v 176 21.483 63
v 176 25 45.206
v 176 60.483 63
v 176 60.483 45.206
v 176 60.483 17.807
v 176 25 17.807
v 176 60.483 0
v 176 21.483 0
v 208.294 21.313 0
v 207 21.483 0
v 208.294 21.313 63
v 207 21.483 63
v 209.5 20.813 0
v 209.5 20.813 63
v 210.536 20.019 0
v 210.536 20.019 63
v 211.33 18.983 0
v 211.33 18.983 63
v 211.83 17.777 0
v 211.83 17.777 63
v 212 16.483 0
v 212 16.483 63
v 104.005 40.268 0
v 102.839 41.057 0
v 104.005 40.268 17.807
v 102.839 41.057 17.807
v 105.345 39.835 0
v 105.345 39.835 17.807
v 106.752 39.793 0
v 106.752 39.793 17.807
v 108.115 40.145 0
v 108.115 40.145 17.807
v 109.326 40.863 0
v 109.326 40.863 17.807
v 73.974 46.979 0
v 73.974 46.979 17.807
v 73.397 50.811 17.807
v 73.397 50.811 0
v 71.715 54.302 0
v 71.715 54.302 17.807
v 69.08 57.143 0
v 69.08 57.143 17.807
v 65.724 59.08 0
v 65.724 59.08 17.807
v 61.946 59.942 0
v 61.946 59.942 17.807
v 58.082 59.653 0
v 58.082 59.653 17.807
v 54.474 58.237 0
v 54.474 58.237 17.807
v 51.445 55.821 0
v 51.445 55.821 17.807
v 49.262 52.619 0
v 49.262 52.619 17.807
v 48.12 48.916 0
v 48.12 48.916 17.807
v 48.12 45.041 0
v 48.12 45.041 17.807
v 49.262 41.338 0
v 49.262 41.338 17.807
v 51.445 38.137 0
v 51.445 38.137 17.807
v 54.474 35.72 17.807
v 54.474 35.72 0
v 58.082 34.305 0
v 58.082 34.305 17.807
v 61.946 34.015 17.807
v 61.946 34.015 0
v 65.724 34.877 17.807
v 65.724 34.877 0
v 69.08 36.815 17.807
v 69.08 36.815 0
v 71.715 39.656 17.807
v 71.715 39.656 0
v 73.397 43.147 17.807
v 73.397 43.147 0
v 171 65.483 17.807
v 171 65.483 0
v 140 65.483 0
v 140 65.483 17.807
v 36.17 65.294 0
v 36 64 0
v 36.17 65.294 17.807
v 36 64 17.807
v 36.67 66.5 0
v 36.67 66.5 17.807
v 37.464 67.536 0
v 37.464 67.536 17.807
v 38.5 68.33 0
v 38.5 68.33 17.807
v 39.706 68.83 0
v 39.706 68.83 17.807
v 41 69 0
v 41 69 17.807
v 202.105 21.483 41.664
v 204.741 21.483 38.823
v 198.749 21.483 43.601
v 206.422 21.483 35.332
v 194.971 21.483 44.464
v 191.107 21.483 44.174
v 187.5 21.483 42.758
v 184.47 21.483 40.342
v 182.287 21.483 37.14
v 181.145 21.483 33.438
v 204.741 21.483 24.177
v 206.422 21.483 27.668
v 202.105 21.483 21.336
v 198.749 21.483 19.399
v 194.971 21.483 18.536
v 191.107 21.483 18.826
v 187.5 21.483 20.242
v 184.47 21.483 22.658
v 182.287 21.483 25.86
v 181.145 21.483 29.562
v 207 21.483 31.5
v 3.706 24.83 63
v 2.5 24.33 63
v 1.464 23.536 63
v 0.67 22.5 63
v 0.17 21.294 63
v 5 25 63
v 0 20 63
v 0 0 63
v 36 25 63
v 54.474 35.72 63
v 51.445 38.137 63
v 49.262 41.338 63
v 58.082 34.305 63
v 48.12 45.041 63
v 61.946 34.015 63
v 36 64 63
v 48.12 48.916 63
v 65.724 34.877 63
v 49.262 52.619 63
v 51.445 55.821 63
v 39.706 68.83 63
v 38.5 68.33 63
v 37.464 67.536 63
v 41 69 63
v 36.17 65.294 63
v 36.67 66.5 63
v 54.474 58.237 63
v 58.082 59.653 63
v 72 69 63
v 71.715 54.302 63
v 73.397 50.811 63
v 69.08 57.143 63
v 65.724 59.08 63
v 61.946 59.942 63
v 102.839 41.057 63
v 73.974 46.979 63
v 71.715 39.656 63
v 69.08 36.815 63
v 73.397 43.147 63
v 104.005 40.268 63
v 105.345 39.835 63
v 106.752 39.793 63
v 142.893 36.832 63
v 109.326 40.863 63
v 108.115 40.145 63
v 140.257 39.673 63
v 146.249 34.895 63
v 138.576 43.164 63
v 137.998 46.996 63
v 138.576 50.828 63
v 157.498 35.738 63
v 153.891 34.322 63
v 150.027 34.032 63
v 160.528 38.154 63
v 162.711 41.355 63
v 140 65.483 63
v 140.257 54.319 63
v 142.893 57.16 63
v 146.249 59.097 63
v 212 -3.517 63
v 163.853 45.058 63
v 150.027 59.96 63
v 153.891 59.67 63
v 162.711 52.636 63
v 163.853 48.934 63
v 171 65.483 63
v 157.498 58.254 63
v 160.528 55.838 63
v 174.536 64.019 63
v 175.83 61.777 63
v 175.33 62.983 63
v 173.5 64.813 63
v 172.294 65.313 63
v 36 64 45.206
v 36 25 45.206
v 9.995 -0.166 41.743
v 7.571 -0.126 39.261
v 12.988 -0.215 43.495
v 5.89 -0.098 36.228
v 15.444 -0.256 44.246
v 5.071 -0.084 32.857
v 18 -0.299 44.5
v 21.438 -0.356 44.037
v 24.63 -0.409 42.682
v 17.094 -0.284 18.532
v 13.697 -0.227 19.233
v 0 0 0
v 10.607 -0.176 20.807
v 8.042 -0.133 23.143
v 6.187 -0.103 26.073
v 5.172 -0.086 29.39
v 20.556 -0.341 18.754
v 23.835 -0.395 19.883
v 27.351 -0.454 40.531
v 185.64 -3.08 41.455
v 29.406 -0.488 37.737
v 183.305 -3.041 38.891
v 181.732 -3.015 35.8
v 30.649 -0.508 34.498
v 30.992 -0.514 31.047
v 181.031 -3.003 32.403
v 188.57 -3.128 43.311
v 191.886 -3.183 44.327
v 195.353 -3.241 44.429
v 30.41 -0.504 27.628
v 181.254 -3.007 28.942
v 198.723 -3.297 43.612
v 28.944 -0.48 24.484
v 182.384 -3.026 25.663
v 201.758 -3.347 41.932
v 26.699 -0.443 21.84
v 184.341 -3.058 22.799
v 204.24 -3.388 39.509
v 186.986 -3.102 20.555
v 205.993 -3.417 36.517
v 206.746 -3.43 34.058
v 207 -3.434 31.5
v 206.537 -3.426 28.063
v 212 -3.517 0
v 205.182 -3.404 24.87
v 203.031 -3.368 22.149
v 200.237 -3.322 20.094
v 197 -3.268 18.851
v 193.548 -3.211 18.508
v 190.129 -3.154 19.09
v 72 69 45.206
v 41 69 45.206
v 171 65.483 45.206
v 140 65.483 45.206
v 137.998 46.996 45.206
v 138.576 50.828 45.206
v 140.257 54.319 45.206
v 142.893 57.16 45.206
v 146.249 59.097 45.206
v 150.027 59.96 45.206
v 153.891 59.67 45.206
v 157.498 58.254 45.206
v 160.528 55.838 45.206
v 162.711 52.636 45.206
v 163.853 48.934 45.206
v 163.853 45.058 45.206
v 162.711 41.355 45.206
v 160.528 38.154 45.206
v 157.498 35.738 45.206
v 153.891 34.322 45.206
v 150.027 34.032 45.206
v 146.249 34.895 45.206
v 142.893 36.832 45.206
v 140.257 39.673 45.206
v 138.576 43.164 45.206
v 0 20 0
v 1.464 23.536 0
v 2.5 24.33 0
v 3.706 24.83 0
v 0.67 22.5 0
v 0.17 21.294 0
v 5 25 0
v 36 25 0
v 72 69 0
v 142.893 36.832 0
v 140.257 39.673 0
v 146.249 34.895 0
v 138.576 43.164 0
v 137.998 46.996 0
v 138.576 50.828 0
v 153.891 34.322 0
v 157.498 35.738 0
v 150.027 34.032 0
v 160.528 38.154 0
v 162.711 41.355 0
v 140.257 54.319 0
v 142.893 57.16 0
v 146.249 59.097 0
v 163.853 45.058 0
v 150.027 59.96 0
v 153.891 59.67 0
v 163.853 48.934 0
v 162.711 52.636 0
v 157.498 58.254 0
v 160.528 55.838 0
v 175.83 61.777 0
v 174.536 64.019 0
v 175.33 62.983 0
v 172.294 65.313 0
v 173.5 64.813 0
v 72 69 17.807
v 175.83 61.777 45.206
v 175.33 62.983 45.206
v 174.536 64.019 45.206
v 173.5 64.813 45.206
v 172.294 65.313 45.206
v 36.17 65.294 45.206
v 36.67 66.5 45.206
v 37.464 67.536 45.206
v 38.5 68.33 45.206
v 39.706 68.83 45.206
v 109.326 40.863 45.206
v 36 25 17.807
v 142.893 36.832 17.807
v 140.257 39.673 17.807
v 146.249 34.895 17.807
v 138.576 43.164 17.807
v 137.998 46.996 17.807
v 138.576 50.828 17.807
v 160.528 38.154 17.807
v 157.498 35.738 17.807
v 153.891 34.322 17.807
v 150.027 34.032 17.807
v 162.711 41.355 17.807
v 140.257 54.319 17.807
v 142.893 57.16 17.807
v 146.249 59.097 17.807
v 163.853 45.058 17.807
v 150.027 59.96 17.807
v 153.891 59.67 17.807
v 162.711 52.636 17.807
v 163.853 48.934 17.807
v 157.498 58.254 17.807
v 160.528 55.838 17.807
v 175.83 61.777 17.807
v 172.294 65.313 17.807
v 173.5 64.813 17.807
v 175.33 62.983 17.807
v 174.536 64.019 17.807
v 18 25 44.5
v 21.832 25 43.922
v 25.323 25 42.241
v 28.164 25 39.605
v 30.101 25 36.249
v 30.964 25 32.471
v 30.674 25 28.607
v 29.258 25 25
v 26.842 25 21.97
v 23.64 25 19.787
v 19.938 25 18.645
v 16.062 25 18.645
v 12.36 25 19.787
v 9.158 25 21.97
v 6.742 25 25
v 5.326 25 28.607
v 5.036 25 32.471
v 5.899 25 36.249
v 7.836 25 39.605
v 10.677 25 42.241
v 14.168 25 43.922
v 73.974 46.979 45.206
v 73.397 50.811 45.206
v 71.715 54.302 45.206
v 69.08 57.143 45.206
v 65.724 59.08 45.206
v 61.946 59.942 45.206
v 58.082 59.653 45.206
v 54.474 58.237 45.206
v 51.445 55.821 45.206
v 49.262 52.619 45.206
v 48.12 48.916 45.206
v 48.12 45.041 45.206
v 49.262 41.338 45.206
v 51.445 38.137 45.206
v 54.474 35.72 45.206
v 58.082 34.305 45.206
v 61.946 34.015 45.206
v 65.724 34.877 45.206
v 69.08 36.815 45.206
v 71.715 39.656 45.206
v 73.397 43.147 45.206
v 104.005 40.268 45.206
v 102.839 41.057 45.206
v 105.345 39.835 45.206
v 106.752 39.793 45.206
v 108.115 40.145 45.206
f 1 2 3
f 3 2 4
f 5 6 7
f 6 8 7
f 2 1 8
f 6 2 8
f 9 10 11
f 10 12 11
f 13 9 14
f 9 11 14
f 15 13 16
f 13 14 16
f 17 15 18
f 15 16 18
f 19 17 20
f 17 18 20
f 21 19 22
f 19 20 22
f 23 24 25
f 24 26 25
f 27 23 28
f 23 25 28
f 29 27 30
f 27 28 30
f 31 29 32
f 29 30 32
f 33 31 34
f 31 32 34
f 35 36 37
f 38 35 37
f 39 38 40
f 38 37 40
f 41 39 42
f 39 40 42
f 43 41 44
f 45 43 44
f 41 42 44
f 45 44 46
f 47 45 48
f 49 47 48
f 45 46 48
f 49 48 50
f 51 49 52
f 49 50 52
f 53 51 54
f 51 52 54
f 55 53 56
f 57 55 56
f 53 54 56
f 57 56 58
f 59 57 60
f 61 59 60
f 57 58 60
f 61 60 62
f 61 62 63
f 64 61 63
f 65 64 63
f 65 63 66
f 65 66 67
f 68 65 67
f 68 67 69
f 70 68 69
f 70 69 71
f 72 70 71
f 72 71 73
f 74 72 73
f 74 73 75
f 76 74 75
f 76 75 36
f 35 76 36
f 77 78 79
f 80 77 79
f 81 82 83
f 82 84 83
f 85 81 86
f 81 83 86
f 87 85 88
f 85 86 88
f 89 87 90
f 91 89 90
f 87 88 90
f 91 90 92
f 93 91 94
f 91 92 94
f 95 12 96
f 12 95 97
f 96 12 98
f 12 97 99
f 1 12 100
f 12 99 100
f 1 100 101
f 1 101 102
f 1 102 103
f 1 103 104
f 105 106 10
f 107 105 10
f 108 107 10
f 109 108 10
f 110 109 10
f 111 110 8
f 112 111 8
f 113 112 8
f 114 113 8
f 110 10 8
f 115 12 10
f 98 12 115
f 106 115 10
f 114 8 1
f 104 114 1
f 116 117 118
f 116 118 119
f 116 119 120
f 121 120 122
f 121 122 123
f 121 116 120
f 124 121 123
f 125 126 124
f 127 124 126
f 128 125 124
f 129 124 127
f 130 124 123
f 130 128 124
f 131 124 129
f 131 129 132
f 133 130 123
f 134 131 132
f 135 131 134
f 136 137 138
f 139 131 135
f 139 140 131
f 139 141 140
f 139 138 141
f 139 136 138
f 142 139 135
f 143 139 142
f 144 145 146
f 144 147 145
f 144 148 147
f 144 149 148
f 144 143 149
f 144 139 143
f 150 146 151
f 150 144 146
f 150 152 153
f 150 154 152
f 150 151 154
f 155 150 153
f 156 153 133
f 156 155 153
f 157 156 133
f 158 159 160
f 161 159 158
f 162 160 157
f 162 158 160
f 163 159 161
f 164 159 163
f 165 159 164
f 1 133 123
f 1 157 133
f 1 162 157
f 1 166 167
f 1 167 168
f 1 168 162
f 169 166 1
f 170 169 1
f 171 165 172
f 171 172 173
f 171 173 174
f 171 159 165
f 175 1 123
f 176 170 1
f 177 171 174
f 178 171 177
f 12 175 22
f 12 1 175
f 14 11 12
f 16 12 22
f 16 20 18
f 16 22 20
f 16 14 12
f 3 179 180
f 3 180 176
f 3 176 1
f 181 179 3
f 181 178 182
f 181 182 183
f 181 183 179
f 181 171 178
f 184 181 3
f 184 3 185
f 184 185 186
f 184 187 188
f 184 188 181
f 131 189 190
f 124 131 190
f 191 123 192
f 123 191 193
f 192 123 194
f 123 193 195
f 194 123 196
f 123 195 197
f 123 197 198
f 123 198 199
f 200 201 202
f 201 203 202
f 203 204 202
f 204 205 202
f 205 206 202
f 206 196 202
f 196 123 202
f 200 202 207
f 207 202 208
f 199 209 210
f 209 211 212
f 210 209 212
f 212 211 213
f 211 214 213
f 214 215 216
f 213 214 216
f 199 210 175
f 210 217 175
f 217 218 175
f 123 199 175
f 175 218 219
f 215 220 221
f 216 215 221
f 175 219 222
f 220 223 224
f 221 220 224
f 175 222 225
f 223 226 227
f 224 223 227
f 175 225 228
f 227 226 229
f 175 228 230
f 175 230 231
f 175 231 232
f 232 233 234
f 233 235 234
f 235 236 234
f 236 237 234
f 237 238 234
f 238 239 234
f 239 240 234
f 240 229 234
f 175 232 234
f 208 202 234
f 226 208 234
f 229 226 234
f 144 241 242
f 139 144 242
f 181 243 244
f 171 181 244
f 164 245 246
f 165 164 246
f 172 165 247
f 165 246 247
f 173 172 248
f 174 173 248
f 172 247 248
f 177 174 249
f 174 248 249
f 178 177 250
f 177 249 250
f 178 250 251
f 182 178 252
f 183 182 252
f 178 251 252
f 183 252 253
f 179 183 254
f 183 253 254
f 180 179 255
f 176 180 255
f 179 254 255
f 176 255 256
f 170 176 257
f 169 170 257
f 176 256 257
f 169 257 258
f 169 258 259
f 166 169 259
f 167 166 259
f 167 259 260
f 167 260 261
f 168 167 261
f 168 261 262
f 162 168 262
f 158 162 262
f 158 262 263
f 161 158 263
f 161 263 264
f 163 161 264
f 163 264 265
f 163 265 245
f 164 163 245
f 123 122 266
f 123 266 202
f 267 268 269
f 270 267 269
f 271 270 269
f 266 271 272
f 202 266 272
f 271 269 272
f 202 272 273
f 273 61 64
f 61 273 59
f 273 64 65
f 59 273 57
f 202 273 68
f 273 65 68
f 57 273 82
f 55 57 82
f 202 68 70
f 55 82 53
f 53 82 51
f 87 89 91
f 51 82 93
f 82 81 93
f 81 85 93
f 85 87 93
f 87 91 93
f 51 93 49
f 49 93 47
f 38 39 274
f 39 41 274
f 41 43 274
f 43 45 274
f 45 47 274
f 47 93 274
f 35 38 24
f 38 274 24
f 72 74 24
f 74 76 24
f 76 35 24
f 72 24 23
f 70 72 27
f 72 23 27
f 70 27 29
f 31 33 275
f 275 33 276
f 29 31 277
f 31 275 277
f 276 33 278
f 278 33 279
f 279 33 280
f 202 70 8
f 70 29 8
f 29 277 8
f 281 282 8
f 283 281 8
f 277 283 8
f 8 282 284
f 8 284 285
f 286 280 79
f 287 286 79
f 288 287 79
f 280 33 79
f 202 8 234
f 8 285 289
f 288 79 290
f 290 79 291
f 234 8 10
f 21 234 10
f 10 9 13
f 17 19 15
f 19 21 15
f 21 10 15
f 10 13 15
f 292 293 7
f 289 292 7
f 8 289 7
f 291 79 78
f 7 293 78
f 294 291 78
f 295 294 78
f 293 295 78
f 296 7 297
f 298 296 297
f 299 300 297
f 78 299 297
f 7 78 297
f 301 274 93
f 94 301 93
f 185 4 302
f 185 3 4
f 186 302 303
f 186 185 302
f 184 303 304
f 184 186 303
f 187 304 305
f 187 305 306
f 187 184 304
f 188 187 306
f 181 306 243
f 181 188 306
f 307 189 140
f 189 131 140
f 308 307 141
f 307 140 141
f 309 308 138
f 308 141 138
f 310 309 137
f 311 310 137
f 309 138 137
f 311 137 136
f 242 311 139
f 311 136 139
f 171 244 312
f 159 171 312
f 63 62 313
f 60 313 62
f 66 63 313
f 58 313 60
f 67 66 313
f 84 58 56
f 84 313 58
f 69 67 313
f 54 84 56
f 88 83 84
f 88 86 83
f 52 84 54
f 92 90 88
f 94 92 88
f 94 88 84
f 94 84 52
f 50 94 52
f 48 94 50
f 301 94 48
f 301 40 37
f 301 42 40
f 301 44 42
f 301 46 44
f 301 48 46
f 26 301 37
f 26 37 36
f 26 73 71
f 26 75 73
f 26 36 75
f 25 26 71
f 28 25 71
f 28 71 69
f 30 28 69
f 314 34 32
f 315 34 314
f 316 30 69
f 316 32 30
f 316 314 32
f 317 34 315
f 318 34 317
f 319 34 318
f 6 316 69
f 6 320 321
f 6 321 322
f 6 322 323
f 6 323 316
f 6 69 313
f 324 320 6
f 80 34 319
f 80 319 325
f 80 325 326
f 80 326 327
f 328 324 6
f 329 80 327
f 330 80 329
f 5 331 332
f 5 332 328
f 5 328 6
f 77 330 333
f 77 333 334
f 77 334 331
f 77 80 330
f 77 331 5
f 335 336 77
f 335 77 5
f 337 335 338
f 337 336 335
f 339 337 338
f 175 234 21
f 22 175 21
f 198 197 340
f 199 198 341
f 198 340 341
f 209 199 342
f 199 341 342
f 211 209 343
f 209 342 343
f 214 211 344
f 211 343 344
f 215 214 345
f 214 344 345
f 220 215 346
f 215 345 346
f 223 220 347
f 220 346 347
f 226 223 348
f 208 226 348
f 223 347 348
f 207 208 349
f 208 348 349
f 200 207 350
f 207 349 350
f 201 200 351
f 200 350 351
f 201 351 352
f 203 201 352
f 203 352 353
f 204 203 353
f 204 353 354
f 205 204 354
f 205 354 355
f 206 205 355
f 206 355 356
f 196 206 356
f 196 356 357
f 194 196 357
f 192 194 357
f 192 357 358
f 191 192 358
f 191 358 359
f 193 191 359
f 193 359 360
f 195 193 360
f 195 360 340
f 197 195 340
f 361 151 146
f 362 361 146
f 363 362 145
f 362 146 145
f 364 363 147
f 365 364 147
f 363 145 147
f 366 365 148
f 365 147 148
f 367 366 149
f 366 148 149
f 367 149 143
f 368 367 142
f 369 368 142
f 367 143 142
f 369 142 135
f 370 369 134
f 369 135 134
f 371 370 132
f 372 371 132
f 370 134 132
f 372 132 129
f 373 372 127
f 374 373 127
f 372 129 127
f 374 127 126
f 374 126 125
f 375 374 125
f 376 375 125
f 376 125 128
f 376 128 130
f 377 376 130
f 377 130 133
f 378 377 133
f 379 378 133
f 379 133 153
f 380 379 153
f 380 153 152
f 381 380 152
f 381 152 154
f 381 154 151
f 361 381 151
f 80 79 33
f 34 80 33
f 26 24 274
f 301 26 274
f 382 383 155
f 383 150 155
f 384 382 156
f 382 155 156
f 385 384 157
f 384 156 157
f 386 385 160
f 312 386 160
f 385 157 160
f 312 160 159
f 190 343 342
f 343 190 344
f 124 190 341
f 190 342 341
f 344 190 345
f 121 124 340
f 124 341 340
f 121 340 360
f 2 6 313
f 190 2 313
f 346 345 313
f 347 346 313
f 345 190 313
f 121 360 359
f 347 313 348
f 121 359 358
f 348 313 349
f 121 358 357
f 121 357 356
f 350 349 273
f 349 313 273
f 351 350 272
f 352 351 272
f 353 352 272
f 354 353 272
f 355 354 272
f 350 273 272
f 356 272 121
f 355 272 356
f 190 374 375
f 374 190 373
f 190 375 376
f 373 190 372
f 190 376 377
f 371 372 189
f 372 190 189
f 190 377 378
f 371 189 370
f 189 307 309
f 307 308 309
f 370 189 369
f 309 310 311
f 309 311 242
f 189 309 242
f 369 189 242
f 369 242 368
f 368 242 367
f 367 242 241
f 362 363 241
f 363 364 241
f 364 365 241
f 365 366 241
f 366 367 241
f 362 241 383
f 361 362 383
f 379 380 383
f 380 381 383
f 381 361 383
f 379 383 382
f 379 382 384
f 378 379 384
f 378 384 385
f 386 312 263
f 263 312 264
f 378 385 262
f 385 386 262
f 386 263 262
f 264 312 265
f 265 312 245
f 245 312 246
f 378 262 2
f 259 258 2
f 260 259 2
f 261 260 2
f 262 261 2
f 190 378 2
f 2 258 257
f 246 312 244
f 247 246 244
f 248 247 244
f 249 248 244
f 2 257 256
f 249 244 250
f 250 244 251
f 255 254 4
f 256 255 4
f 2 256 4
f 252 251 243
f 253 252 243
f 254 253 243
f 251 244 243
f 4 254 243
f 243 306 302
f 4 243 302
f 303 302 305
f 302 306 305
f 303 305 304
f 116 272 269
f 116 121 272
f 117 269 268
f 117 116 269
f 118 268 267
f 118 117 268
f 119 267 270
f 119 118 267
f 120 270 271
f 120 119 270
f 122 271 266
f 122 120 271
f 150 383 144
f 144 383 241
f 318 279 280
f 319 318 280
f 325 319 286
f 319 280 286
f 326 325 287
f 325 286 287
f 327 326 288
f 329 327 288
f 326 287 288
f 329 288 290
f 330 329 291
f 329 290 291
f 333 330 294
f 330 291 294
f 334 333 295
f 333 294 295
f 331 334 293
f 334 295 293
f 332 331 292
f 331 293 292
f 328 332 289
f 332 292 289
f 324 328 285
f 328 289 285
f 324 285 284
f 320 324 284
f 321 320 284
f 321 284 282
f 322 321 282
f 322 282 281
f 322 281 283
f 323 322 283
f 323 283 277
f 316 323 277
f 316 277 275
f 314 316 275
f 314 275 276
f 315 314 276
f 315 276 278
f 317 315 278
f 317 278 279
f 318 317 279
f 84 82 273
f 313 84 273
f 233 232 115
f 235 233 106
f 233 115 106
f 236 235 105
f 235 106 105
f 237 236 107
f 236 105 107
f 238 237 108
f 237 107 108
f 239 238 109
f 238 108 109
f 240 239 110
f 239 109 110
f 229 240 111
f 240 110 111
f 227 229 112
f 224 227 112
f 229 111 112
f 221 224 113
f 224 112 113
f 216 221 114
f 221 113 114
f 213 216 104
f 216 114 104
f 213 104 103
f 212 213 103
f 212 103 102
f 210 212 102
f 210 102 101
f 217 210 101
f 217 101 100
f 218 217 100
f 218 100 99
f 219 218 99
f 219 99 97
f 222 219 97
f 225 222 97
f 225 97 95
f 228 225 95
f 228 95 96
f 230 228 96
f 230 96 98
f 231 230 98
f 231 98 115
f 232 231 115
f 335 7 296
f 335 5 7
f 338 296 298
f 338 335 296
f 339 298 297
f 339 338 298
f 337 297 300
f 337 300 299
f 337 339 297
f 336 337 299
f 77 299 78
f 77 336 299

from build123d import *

# Parameters (mm, degrees)
BOSS_EXTRUDE1_DEPTH = 63
SKETCH10_R          = 13
CUT_EXTRUDE3_DEPTH  = 70
SKETCH12_R          = 13
CUT_EXTRUDE4_DEPTH  = 70
SKETCH16_W          = 140
SKETCH16_H          = 27.398314348
CUT_EXTRUDE6_DEPTH  = 44
SKETCH17_R          = 13
CUT_EXTRUDE7_DEPTH  = 100
FILLET1_R           = 5
FILLET2_R           = 5
FILLET3_R           = 5
FILLET4_R           = 5
FILLET5_R           = 5
FILLET6_R           = 5
FILLET7_R           = 5
FILLET8_R           = 5


with BuildPart() as part:
    # Sketch2 → Boss-Extrude1 (new body)
    with BuildSketch(Plane.XY):
        Polygon((0, 0), (212, -3.51679799), (212, 21.48320201), (176, 21.48320201), (176, 65.48320201), (140, 65.48320201), (106, 38.193220771), (72, 69), (36, 69), (36, 25), (0, 25), align=None)
    extrude(amount=BOSS_EXTRUDE1_DEPTH)

    # Sketch10 → Cut-Extrude3 (cut)
    with BuildSketch(Plane(origin=(0, 0, 0), x_dir=(-1, 0, 0), z_dir=(0, 0, -1))):
        with Locations((-150.998263924, 46.995976699)):
            Circle(SKETCH10_R)
    extrude(amount=-CUT_EXTRUDE3_DEPTH, mode=Mode.SUBTRACT)

    # Sketch12 → Cut-Extrude4 (cut)
    with BuildSketch(Plane(origin=(0, 25, 0), x_dir=(1, 0, 0), z_dir=(0, 1, 0))):
        with Locations(Location((18, -31.5, 0), (0, 0, 270))):
            Circle(SKETCH12_R)
        with Locations((194, -31.5)):
            Circle(SKETCH12_R)
    extrude(amount=-CUT_EXTRUDE4_DEPTH, mode=Mode.SUBTRACT)

    # Sketch16 → Cut-Extrude6 (cut)
    with BuildSketch(Plane(origin=(0, 69, 0), x_dir=(1, 0, 0), z_dir=(0, 1, 0))):
        with Locations((106, -31.506588427)):
            Rectangle(SKETCH16_W, SKETCH16_H)
    extrude(amount=-CUT_EXTRUDE6_DEPTH, mode=Mode.SUBTRACT)

    # Sketch17 → Cut-Extrude7 (cut)
    with BuildSketch(Plane.XY.offset(63)):
        with Locations((60.97435617, 46.978804013)):
            Circle(SKETCH17_R)
    extrude(amount=-CUT_EXTRUDE7_DEPTH, mode=Mode.SUBTRACT)

    # Fillet1
    fillet1_edges = [part.edges().sort_by_distance(p)[0] for p in [
        (106, 38.193220771, 8.903715627),
    ]]
    fillet(fillet1_edges, radius=FILLET1_R)

    # Fillet2
    fillet2_edges = [part.edges().sort_by_distance(p)[0] for p in [
        (106, 38.193220771, 54.102872801),
    ]]
    fillet(fillet2_edges, radius=FILLET2_R)

    # Fillet3
    fillet3_edges = [part.edges().sort_by_distance(p)[0] for p in [
        (212, 21.48320201, 31.5),
    ]]
    fillet(fillet3_edges, radius=FILLET3_R - 0.0001)  # a hair under: the kernel refuses the full size

    # Fillet4
    fillet4_edges = [part.edges().sort_by_distance(p)[0] for p in [
        (176, 65.48320201, 54.102872801),
    ]]
    fillet(fillet4_edges, radius=FILLET4_R)

    # Fillet5
    fillet5_edges = [part.edges().sort_by_distance(p)[0] for p in [
        (176, 65.48320201, 8.903715627),
    ]]
    fillet(fillet5_edges, radius=FILLET5_R)

    # Fillet6
    fillet6_edges = [part.edges().sort_by_distance(p)[0] for p in [
        (36, 69, 54.102872801),
    ]]
    fillet(fillet6_edges, radius=FILLET6_R)

    # Fillet7
    fillet7_edges = [part.edges().sort_by_distance(p)[0] for p in [
        (36, 69, 8.903715627),
    ]]
    fillet(fillet7_edges, radius=FILLET7_R)

    # Fillet8
    fillet8_edges = [part.edges().sort_by_distance(p)[0] for p in [
        (0, 25, 31.5),
    ]]
    fillet(fillet8_edges, radius=FILLET8_R - 0.0001)  # a hair under: the kernel refuses the full size


solid = part.part
